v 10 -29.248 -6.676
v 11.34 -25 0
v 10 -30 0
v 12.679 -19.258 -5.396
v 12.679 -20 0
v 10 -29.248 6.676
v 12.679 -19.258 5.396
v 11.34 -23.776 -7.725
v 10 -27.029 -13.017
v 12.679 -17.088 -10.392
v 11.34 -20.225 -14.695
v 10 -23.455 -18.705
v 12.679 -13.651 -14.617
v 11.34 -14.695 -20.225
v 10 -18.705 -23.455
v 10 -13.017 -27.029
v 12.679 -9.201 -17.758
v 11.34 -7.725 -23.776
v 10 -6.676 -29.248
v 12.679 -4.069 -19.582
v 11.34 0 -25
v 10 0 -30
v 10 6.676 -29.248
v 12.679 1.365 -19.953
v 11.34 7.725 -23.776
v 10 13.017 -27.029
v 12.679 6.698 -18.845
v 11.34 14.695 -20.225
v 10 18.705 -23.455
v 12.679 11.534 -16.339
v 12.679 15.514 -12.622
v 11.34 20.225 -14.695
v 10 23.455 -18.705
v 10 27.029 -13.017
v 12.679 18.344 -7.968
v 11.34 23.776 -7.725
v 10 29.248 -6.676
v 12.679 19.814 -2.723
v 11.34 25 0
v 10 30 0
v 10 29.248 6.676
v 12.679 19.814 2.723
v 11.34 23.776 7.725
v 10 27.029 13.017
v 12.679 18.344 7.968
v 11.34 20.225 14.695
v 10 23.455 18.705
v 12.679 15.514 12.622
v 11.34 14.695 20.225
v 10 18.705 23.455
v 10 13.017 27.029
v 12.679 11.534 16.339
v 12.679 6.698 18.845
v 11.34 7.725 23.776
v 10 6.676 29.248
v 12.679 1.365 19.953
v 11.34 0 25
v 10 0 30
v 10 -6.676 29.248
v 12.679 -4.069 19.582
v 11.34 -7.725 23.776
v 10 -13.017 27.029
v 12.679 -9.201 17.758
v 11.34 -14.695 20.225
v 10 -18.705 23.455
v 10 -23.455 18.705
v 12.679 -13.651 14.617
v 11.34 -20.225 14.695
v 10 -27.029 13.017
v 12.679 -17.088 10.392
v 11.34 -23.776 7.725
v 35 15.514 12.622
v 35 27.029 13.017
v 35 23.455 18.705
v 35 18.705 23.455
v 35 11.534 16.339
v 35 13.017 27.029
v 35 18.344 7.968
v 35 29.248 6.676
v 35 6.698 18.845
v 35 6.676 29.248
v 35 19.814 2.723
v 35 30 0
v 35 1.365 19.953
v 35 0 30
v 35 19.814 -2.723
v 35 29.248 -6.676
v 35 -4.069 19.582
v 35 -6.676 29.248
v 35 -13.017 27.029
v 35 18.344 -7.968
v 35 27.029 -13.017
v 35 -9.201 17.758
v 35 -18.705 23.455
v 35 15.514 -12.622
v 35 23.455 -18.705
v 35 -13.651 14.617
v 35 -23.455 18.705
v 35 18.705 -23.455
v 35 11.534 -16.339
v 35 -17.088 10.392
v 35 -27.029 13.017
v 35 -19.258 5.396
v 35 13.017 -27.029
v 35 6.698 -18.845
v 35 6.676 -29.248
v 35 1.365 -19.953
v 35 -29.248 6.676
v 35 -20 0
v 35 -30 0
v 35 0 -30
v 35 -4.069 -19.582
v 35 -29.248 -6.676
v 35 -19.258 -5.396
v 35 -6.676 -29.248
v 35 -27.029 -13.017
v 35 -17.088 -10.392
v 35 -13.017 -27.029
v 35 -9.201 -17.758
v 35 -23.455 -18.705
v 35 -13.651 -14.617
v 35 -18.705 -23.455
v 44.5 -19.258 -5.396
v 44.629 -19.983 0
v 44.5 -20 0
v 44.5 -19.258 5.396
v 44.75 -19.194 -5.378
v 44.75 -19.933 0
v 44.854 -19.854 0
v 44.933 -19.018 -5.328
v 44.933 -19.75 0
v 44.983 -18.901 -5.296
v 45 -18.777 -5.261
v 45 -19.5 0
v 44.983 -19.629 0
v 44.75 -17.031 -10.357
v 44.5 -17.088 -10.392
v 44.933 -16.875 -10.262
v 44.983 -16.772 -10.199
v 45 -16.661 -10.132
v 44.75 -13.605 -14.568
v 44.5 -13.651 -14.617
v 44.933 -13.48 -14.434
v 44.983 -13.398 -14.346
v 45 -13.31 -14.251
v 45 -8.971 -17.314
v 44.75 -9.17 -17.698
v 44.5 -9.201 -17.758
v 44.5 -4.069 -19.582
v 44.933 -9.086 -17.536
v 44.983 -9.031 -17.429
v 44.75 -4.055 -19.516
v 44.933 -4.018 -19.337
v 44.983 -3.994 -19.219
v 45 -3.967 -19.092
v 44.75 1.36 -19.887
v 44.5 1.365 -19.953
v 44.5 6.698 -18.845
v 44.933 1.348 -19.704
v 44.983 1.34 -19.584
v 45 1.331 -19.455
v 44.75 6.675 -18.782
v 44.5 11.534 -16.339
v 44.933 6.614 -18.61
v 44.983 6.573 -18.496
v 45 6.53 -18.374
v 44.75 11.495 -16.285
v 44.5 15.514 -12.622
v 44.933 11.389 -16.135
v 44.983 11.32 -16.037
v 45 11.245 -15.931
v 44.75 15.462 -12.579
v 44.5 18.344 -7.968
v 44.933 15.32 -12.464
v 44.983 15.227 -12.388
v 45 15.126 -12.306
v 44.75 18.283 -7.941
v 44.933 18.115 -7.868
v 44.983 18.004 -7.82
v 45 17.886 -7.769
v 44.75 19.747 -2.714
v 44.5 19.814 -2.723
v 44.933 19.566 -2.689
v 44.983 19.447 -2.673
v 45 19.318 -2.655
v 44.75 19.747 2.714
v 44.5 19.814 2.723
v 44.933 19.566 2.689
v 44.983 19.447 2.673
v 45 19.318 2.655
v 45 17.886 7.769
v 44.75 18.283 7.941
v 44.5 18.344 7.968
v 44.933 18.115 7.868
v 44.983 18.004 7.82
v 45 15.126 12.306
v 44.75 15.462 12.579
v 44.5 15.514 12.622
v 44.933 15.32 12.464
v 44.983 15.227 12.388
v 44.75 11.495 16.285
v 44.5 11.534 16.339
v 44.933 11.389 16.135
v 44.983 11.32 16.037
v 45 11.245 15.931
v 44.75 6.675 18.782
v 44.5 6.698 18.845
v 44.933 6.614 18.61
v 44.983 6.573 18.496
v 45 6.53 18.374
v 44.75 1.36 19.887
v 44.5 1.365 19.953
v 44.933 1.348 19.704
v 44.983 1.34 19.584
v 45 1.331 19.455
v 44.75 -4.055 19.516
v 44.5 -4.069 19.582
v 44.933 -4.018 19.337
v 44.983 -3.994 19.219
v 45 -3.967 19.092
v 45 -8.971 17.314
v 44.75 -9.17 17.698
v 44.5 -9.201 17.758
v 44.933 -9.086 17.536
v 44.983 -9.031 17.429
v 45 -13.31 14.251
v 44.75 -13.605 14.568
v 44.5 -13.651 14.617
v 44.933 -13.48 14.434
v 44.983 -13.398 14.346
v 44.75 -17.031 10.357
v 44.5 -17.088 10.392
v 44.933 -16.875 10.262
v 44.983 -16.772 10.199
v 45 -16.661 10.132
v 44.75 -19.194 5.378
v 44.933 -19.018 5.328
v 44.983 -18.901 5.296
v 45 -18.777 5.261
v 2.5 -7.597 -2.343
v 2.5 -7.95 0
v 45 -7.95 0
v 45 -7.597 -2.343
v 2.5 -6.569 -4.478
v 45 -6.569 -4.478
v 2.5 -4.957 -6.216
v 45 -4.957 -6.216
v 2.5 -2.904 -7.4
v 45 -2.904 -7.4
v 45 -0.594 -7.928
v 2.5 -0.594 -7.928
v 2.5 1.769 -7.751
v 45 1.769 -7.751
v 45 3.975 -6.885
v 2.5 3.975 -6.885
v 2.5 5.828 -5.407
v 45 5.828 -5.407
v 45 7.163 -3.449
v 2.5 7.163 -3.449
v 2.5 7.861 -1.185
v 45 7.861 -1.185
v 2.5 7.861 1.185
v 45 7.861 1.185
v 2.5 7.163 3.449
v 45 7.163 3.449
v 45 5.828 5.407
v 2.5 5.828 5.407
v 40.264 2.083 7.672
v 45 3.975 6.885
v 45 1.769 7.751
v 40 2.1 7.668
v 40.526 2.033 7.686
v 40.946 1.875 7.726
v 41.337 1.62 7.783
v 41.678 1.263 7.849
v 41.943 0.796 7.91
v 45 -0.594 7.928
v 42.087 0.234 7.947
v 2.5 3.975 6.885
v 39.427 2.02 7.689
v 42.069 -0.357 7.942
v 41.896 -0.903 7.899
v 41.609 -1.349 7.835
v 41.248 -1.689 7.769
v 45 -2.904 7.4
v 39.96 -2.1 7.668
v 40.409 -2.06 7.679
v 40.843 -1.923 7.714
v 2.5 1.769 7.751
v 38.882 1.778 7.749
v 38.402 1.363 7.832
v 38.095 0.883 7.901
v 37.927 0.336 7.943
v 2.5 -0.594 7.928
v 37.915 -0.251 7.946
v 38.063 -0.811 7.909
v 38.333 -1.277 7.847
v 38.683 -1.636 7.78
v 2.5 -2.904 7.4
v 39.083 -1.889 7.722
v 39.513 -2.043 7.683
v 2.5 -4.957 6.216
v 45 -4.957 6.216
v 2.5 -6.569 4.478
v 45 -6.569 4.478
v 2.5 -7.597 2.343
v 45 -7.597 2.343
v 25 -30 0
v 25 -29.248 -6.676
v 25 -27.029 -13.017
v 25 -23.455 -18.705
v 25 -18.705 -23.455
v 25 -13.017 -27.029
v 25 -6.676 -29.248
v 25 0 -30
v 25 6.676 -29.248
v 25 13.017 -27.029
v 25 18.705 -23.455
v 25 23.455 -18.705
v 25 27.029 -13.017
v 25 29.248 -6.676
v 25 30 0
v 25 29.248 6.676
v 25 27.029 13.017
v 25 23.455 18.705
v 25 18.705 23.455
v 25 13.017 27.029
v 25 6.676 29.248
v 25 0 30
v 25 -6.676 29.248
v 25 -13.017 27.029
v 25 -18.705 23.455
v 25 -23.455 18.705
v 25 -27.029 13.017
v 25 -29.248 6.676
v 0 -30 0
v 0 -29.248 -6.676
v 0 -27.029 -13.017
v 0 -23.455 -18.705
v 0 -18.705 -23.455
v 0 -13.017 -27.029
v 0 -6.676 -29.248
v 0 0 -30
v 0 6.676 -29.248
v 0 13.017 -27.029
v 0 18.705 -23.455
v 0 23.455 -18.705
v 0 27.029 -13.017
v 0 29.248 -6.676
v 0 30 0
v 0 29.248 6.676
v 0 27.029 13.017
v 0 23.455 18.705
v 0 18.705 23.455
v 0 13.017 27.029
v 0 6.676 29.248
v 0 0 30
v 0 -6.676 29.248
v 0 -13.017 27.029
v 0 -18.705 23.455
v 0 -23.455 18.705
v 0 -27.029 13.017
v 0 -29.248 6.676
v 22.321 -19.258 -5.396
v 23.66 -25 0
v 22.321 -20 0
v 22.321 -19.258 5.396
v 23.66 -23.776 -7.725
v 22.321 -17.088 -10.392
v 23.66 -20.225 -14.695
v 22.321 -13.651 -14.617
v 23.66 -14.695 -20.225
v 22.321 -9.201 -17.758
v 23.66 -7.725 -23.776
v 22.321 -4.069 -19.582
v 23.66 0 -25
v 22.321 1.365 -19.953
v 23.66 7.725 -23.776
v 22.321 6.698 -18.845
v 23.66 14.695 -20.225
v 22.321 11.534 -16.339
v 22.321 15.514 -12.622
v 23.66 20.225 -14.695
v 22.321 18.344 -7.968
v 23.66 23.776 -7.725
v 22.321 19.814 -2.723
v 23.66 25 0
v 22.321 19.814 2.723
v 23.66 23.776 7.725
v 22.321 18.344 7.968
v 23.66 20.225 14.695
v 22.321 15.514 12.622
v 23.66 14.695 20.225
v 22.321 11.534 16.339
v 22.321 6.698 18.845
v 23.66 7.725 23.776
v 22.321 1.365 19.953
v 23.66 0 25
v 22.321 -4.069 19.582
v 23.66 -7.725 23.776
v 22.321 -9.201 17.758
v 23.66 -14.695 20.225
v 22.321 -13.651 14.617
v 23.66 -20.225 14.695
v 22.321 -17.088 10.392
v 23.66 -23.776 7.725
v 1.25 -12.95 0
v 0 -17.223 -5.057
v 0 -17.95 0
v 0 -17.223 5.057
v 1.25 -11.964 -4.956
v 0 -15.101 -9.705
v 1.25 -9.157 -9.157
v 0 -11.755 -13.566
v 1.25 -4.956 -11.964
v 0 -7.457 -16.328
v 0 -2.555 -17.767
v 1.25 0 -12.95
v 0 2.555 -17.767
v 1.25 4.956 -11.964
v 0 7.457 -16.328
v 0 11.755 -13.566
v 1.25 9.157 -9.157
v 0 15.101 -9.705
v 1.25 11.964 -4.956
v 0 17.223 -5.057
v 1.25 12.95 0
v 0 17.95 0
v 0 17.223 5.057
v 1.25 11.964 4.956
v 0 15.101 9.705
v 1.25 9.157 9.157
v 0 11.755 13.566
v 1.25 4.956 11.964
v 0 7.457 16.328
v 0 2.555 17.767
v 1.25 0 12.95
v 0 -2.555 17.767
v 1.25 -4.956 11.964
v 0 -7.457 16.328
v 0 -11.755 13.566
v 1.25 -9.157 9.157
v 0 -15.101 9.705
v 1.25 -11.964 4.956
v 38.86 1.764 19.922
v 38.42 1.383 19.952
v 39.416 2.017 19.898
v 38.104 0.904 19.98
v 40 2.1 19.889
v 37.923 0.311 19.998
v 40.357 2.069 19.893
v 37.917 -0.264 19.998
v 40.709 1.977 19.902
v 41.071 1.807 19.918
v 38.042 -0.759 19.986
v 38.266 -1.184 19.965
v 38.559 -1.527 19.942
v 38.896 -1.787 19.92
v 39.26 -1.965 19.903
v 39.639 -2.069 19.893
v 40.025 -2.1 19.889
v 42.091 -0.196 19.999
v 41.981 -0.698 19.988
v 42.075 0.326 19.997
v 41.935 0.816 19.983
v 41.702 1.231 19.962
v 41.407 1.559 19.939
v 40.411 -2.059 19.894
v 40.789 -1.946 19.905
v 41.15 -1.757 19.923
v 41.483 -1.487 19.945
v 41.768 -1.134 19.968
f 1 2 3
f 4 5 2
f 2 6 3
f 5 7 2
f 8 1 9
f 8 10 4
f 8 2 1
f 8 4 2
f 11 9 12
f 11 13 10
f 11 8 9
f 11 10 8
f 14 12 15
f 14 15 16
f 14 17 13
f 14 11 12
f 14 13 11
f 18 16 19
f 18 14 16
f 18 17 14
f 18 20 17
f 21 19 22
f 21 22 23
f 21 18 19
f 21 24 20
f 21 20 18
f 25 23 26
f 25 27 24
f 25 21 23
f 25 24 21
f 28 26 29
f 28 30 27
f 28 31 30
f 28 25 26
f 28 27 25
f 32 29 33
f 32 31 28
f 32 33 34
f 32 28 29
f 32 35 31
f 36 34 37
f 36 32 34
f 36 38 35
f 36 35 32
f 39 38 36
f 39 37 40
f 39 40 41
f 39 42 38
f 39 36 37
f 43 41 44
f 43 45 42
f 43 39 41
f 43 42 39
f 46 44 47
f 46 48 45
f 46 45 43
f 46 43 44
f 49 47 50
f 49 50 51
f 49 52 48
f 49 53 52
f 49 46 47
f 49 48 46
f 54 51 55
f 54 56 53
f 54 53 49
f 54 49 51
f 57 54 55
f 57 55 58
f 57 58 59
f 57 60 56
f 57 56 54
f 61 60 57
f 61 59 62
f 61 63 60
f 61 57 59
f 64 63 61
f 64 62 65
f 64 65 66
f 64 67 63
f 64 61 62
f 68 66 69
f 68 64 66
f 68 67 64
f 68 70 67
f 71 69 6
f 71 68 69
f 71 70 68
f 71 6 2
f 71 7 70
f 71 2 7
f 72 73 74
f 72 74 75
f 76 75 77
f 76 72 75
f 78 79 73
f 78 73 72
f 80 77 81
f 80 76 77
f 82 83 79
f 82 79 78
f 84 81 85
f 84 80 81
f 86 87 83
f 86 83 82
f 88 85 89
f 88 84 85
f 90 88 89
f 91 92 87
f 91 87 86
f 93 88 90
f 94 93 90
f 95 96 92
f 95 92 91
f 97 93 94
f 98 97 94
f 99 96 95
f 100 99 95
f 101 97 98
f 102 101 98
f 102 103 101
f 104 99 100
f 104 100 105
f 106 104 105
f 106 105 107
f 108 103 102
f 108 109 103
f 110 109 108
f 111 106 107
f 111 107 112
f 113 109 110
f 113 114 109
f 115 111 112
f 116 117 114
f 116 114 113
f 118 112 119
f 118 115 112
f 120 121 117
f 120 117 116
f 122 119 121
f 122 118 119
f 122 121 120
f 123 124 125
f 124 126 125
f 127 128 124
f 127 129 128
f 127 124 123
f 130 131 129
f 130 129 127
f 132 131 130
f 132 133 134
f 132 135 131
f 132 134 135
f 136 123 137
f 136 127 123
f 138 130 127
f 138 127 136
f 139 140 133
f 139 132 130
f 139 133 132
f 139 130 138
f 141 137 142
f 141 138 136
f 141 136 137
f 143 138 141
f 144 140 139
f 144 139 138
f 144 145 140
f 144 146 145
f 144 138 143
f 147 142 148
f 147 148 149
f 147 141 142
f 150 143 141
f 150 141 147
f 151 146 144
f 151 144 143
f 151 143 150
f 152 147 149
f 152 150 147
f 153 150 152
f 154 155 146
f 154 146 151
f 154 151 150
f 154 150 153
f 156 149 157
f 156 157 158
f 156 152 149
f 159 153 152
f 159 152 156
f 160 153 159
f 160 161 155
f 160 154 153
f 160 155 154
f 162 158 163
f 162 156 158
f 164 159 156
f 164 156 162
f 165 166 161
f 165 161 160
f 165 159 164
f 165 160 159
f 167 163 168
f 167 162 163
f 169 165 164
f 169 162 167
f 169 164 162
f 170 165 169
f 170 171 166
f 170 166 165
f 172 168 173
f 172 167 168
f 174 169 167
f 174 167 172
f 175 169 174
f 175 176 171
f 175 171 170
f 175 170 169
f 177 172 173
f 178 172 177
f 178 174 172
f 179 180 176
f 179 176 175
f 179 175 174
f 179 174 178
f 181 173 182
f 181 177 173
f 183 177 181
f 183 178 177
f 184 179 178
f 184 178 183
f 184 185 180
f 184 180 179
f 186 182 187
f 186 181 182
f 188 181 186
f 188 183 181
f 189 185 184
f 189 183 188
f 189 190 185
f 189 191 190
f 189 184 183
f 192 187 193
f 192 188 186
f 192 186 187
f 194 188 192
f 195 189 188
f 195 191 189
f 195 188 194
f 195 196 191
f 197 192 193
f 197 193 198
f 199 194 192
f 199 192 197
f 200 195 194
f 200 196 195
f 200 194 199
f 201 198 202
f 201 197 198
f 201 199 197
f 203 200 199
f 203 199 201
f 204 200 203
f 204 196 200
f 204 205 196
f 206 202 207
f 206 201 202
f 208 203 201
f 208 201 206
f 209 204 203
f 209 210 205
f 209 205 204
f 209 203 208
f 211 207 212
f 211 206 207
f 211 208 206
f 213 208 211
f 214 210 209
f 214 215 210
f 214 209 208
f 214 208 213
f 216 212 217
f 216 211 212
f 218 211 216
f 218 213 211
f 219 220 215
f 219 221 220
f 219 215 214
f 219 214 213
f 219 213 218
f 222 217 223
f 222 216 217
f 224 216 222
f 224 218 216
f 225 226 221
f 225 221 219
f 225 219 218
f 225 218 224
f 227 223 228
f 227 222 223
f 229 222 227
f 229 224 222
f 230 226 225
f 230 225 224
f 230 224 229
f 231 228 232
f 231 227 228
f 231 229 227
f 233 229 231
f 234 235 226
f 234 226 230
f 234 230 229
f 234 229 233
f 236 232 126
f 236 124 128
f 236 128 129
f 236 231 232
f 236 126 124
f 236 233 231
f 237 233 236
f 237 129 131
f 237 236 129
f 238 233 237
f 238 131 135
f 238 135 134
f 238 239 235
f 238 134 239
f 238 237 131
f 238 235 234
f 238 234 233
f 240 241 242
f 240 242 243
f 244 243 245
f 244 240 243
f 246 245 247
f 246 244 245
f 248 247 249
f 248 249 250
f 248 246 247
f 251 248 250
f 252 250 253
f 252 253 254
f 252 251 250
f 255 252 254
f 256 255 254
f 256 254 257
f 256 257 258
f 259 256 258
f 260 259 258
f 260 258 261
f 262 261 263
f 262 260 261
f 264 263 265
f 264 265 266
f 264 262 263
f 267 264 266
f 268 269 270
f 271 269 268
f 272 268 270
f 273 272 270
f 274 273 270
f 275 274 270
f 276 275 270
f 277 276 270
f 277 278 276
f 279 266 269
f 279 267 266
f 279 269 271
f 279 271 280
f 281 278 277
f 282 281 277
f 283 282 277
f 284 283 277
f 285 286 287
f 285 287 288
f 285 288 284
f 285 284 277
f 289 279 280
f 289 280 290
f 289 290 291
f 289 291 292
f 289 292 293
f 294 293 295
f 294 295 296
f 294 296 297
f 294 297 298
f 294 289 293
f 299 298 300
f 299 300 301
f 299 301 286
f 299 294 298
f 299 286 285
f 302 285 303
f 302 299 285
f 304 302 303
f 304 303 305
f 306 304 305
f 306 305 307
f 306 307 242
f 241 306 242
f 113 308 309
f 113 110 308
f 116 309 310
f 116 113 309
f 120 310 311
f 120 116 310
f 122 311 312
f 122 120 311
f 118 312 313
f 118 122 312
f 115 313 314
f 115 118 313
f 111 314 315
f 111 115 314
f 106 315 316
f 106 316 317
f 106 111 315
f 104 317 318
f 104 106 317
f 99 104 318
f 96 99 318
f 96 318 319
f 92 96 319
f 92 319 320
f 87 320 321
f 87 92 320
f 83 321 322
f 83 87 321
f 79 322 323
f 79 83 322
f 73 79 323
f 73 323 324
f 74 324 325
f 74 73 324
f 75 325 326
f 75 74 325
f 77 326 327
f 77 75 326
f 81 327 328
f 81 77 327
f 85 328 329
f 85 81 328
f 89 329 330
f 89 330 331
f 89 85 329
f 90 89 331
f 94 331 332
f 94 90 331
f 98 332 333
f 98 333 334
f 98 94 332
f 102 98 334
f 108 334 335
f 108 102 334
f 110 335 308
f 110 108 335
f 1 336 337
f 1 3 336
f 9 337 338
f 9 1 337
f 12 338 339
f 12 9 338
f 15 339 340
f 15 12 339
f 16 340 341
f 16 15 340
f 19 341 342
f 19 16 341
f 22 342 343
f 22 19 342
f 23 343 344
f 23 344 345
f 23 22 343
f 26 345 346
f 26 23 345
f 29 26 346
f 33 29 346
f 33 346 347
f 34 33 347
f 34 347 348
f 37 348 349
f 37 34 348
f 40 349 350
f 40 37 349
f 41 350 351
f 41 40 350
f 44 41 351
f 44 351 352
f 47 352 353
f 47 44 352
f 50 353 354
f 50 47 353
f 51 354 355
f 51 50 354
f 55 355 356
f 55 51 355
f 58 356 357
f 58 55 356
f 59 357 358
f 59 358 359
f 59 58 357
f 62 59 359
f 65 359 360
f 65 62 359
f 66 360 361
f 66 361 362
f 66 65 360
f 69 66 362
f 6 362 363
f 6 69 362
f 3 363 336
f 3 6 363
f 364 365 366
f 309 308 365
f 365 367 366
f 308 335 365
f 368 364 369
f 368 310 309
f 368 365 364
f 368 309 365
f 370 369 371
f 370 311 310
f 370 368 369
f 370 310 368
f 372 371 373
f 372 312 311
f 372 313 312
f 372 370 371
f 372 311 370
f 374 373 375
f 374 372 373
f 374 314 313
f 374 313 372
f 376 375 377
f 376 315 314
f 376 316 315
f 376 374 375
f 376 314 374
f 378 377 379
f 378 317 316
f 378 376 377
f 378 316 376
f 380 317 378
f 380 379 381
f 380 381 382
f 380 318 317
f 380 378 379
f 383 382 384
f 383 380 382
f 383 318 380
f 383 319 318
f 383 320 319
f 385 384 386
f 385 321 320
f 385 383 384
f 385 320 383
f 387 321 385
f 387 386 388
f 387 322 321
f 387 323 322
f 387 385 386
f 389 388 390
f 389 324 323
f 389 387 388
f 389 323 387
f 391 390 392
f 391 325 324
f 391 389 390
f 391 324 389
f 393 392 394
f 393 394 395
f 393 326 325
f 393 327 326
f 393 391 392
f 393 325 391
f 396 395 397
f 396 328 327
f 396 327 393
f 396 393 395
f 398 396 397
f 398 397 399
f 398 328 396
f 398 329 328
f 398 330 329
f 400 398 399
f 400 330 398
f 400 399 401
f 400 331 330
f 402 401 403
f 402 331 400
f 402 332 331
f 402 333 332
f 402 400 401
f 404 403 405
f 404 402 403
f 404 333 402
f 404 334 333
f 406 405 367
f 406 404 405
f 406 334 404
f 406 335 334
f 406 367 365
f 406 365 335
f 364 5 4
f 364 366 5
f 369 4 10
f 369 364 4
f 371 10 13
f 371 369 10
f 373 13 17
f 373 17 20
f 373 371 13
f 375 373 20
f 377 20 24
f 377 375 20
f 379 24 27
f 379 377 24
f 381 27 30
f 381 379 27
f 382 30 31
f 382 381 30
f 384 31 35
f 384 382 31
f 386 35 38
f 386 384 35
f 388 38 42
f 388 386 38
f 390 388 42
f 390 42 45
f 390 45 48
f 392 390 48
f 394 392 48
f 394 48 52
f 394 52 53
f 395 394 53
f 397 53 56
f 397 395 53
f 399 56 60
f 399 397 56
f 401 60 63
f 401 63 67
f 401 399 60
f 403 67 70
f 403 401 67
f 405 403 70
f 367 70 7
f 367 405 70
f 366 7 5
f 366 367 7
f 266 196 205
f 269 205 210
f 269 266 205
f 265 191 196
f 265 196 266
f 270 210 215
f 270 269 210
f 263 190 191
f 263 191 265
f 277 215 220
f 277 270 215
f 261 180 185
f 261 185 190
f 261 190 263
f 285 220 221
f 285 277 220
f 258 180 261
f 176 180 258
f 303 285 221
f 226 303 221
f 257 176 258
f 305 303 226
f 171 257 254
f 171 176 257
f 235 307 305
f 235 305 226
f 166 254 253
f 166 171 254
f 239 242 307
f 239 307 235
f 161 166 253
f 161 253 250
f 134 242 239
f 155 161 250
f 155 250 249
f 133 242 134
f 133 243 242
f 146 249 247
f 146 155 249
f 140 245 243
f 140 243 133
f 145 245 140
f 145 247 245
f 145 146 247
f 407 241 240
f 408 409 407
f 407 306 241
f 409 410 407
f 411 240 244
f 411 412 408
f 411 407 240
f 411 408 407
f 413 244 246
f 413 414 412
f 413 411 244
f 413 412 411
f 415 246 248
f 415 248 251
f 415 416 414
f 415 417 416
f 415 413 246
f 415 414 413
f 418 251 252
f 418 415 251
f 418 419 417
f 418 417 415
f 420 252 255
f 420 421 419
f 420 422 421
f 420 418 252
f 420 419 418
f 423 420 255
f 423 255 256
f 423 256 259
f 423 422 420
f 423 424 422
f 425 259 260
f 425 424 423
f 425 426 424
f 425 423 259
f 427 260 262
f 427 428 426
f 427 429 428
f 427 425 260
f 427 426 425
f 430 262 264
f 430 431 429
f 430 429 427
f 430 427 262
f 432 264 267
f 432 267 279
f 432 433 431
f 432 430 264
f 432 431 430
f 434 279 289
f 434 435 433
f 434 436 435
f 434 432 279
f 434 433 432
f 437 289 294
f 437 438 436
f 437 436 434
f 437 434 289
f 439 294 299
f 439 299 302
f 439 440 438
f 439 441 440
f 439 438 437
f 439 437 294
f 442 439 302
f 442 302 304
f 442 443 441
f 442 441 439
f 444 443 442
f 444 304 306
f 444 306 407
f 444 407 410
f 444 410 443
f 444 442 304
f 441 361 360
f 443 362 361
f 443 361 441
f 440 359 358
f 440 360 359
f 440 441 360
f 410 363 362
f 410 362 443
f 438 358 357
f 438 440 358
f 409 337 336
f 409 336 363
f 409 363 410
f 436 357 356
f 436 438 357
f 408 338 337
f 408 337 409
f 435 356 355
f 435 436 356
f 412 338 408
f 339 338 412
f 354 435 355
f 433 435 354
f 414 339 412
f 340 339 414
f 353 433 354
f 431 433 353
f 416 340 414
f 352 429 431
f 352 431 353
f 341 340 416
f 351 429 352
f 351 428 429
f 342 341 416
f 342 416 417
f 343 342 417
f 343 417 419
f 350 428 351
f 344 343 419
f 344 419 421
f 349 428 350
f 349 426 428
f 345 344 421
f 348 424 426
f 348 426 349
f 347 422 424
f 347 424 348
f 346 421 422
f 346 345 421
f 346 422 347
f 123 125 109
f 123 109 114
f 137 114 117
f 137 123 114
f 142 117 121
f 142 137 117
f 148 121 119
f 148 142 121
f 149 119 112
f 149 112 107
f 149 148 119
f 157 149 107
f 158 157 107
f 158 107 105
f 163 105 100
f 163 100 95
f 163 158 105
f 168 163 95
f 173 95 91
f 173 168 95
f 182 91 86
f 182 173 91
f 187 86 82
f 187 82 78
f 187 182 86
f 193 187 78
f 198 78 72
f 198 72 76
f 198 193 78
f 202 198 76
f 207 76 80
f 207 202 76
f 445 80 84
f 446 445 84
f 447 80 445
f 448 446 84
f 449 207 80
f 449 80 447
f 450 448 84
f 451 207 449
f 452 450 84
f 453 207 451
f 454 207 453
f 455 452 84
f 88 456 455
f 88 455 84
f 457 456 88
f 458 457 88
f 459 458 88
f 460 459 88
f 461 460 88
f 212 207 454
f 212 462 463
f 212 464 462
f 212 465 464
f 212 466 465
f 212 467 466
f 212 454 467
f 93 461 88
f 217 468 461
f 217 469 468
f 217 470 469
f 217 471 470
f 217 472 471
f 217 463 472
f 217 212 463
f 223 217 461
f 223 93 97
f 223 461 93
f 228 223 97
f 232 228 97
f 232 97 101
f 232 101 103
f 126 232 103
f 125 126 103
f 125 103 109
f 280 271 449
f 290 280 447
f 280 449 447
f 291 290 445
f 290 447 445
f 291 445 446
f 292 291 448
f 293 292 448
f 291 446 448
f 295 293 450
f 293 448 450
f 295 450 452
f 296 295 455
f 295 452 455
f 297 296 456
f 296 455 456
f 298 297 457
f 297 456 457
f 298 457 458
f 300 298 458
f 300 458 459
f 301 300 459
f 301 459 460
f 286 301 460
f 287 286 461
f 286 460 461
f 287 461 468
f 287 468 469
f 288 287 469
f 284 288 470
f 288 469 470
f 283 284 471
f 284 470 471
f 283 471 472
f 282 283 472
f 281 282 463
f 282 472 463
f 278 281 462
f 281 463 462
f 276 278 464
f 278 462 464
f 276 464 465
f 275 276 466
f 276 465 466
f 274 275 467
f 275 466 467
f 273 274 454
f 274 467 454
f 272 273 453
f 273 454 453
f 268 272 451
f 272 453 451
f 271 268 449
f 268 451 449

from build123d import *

# Parameters (mm, degrees)
ESBO_O1_W = 2.1
ESBO_O1_H = 30


with BuildPart() as part:
    # Sketch1 → Revolve1 (revolve)
    with BuildSketch(Plane.XY):
        with BuildLine():
            Line((0, -17.95), (0, -30))
            Line((0, -30), (10, -30))
            Line((10, -30), (12.679491924, -20))
            Line((12.679491924, -20), (22.320508076, -20))
            Line((22.320508076, -20), (25, -30))
            Line((25, -30), (35, -30))
            Line((35, -30), (35, -20))
            Line((35, -20), (44.5, -20))
            ThreePointArc((44.5, -20), (44.853553391, -19.853553391), (45, -19.5))
            Line((45, -19.5), (45, -7.95))
            Line((45, -7.95), (2.5, -7.95))
            Line((2.5, -7.95), (0, -17.95))
        make_face()
    revolve(axis=Axis((0, 0, 0), (1, 0, 0)))

    # Esboço1 → Broca de rosquear para tarraxa de M5x0.81 (revolve, cut)
    with BuildSketch(Plane.YZ.offset(40)):
        with Locations((1.05, 15)):
            Rectangle(ESBO_O1_W, ESBO_O1_H)
    revolve(axis=Axis((40, 0, -6.35), (0, 0, 1)), mode=Mode.SUBTRACT)


solid = part.part
